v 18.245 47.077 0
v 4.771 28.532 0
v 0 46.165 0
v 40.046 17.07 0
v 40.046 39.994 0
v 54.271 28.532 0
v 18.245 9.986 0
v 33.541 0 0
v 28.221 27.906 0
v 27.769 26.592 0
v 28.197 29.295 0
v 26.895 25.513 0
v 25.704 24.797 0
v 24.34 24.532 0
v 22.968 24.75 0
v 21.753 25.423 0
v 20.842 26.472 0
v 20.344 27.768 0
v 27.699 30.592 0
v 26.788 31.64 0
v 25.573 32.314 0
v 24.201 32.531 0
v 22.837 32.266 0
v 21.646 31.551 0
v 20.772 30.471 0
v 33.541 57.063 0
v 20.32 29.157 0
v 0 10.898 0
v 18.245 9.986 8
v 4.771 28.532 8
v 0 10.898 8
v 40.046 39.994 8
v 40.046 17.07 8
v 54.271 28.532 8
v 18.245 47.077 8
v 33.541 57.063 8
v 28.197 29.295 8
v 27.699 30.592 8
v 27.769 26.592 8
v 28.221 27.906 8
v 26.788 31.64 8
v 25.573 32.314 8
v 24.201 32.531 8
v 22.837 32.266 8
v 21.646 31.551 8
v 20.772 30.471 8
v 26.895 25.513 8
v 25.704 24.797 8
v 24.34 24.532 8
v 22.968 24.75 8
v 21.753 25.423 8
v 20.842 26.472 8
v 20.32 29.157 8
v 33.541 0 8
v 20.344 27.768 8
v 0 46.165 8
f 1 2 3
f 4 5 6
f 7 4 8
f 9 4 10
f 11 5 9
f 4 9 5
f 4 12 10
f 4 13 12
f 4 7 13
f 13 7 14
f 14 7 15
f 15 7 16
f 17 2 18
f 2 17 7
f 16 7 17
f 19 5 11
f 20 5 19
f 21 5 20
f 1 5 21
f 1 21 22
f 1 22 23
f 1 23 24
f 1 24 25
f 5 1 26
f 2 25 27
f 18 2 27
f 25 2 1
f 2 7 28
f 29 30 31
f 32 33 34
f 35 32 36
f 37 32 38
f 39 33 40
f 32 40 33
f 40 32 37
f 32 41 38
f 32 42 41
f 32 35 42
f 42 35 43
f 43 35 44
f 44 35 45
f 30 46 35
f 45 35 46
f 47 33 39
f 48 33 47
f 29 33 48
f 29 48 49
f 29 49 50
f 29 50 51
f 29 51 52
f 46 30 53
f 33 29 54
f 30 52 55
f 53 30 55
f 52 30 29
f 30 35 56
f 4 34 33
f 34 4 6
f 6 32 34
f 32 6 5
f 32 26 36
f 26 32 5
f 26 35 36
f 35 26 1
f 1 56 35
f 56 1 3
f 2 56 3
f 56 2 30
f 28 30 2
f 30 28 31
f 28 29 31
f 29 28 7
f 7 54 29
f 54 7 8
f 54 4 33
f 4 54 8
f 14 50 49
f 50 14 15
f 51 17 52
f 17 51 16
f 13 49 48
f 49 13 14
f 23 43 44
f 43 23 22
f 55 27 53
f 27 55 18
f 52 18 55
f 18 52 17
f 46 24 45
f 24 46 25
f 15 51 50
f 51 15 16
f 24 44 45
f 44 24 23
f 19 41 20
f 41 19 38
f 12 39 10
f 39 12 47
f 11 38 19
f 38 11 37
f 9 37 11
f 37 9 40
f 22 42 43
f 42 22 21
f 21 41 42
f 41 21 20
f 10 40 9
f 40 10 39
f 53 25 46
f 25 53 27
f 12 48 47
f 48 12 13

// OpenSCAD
$fn = 32;

// ----------------------------------------------------------------------
// Star wheel: 5-point blunt, R30
// ----------------------------------------------------------------------

// --- parameters (mm) ---
n_points = 5;             // number of points / teeth
r_out = 30;               // tip radius
r_in = 19.5;              // root radius
bore_r = 4;               // centre bore radius
plate_t = 8;              // plate thickness, Z (extrusion height)
bore_d = 8;               // centre bore diameter

profile = [[54.271, 28.532], [40.046, 39.994], [33.541, 57.063], [18.245, 47.077], [0, 46.165], [4.771, 28.532], [0, 10.898], [18.245, 9.986], [33.541, 0], [40.046, 17.07]];  // primary outline, 10 points, counter clockwise
void_1 = [[28.197, 29.295], [27.699, 30.592], [26.788, 31.64], [25.573, 32.314], [24.201, 32.531], [22.837, 32.266], [21.646, 31.551], [20.772, 30.471], [20.32, 29.157], [20.344, 27.768], [20.842, 26.472], [21.753, 25.423], [22.968, 24.75], [24.34, 24.532], [25.704, 24.797], [26.895, 25.513], [27.769, 26.592], [28.221, 27.906]];  // centre bore, 18 points

// --- the one profile operation ---
difference() {
  linear_extrude(height = plate_t) polygon(points = profile);
  translate([0, 0, -1])
    linear_extrude(height = plate_t + 2) polygon(points = void_1);
}
